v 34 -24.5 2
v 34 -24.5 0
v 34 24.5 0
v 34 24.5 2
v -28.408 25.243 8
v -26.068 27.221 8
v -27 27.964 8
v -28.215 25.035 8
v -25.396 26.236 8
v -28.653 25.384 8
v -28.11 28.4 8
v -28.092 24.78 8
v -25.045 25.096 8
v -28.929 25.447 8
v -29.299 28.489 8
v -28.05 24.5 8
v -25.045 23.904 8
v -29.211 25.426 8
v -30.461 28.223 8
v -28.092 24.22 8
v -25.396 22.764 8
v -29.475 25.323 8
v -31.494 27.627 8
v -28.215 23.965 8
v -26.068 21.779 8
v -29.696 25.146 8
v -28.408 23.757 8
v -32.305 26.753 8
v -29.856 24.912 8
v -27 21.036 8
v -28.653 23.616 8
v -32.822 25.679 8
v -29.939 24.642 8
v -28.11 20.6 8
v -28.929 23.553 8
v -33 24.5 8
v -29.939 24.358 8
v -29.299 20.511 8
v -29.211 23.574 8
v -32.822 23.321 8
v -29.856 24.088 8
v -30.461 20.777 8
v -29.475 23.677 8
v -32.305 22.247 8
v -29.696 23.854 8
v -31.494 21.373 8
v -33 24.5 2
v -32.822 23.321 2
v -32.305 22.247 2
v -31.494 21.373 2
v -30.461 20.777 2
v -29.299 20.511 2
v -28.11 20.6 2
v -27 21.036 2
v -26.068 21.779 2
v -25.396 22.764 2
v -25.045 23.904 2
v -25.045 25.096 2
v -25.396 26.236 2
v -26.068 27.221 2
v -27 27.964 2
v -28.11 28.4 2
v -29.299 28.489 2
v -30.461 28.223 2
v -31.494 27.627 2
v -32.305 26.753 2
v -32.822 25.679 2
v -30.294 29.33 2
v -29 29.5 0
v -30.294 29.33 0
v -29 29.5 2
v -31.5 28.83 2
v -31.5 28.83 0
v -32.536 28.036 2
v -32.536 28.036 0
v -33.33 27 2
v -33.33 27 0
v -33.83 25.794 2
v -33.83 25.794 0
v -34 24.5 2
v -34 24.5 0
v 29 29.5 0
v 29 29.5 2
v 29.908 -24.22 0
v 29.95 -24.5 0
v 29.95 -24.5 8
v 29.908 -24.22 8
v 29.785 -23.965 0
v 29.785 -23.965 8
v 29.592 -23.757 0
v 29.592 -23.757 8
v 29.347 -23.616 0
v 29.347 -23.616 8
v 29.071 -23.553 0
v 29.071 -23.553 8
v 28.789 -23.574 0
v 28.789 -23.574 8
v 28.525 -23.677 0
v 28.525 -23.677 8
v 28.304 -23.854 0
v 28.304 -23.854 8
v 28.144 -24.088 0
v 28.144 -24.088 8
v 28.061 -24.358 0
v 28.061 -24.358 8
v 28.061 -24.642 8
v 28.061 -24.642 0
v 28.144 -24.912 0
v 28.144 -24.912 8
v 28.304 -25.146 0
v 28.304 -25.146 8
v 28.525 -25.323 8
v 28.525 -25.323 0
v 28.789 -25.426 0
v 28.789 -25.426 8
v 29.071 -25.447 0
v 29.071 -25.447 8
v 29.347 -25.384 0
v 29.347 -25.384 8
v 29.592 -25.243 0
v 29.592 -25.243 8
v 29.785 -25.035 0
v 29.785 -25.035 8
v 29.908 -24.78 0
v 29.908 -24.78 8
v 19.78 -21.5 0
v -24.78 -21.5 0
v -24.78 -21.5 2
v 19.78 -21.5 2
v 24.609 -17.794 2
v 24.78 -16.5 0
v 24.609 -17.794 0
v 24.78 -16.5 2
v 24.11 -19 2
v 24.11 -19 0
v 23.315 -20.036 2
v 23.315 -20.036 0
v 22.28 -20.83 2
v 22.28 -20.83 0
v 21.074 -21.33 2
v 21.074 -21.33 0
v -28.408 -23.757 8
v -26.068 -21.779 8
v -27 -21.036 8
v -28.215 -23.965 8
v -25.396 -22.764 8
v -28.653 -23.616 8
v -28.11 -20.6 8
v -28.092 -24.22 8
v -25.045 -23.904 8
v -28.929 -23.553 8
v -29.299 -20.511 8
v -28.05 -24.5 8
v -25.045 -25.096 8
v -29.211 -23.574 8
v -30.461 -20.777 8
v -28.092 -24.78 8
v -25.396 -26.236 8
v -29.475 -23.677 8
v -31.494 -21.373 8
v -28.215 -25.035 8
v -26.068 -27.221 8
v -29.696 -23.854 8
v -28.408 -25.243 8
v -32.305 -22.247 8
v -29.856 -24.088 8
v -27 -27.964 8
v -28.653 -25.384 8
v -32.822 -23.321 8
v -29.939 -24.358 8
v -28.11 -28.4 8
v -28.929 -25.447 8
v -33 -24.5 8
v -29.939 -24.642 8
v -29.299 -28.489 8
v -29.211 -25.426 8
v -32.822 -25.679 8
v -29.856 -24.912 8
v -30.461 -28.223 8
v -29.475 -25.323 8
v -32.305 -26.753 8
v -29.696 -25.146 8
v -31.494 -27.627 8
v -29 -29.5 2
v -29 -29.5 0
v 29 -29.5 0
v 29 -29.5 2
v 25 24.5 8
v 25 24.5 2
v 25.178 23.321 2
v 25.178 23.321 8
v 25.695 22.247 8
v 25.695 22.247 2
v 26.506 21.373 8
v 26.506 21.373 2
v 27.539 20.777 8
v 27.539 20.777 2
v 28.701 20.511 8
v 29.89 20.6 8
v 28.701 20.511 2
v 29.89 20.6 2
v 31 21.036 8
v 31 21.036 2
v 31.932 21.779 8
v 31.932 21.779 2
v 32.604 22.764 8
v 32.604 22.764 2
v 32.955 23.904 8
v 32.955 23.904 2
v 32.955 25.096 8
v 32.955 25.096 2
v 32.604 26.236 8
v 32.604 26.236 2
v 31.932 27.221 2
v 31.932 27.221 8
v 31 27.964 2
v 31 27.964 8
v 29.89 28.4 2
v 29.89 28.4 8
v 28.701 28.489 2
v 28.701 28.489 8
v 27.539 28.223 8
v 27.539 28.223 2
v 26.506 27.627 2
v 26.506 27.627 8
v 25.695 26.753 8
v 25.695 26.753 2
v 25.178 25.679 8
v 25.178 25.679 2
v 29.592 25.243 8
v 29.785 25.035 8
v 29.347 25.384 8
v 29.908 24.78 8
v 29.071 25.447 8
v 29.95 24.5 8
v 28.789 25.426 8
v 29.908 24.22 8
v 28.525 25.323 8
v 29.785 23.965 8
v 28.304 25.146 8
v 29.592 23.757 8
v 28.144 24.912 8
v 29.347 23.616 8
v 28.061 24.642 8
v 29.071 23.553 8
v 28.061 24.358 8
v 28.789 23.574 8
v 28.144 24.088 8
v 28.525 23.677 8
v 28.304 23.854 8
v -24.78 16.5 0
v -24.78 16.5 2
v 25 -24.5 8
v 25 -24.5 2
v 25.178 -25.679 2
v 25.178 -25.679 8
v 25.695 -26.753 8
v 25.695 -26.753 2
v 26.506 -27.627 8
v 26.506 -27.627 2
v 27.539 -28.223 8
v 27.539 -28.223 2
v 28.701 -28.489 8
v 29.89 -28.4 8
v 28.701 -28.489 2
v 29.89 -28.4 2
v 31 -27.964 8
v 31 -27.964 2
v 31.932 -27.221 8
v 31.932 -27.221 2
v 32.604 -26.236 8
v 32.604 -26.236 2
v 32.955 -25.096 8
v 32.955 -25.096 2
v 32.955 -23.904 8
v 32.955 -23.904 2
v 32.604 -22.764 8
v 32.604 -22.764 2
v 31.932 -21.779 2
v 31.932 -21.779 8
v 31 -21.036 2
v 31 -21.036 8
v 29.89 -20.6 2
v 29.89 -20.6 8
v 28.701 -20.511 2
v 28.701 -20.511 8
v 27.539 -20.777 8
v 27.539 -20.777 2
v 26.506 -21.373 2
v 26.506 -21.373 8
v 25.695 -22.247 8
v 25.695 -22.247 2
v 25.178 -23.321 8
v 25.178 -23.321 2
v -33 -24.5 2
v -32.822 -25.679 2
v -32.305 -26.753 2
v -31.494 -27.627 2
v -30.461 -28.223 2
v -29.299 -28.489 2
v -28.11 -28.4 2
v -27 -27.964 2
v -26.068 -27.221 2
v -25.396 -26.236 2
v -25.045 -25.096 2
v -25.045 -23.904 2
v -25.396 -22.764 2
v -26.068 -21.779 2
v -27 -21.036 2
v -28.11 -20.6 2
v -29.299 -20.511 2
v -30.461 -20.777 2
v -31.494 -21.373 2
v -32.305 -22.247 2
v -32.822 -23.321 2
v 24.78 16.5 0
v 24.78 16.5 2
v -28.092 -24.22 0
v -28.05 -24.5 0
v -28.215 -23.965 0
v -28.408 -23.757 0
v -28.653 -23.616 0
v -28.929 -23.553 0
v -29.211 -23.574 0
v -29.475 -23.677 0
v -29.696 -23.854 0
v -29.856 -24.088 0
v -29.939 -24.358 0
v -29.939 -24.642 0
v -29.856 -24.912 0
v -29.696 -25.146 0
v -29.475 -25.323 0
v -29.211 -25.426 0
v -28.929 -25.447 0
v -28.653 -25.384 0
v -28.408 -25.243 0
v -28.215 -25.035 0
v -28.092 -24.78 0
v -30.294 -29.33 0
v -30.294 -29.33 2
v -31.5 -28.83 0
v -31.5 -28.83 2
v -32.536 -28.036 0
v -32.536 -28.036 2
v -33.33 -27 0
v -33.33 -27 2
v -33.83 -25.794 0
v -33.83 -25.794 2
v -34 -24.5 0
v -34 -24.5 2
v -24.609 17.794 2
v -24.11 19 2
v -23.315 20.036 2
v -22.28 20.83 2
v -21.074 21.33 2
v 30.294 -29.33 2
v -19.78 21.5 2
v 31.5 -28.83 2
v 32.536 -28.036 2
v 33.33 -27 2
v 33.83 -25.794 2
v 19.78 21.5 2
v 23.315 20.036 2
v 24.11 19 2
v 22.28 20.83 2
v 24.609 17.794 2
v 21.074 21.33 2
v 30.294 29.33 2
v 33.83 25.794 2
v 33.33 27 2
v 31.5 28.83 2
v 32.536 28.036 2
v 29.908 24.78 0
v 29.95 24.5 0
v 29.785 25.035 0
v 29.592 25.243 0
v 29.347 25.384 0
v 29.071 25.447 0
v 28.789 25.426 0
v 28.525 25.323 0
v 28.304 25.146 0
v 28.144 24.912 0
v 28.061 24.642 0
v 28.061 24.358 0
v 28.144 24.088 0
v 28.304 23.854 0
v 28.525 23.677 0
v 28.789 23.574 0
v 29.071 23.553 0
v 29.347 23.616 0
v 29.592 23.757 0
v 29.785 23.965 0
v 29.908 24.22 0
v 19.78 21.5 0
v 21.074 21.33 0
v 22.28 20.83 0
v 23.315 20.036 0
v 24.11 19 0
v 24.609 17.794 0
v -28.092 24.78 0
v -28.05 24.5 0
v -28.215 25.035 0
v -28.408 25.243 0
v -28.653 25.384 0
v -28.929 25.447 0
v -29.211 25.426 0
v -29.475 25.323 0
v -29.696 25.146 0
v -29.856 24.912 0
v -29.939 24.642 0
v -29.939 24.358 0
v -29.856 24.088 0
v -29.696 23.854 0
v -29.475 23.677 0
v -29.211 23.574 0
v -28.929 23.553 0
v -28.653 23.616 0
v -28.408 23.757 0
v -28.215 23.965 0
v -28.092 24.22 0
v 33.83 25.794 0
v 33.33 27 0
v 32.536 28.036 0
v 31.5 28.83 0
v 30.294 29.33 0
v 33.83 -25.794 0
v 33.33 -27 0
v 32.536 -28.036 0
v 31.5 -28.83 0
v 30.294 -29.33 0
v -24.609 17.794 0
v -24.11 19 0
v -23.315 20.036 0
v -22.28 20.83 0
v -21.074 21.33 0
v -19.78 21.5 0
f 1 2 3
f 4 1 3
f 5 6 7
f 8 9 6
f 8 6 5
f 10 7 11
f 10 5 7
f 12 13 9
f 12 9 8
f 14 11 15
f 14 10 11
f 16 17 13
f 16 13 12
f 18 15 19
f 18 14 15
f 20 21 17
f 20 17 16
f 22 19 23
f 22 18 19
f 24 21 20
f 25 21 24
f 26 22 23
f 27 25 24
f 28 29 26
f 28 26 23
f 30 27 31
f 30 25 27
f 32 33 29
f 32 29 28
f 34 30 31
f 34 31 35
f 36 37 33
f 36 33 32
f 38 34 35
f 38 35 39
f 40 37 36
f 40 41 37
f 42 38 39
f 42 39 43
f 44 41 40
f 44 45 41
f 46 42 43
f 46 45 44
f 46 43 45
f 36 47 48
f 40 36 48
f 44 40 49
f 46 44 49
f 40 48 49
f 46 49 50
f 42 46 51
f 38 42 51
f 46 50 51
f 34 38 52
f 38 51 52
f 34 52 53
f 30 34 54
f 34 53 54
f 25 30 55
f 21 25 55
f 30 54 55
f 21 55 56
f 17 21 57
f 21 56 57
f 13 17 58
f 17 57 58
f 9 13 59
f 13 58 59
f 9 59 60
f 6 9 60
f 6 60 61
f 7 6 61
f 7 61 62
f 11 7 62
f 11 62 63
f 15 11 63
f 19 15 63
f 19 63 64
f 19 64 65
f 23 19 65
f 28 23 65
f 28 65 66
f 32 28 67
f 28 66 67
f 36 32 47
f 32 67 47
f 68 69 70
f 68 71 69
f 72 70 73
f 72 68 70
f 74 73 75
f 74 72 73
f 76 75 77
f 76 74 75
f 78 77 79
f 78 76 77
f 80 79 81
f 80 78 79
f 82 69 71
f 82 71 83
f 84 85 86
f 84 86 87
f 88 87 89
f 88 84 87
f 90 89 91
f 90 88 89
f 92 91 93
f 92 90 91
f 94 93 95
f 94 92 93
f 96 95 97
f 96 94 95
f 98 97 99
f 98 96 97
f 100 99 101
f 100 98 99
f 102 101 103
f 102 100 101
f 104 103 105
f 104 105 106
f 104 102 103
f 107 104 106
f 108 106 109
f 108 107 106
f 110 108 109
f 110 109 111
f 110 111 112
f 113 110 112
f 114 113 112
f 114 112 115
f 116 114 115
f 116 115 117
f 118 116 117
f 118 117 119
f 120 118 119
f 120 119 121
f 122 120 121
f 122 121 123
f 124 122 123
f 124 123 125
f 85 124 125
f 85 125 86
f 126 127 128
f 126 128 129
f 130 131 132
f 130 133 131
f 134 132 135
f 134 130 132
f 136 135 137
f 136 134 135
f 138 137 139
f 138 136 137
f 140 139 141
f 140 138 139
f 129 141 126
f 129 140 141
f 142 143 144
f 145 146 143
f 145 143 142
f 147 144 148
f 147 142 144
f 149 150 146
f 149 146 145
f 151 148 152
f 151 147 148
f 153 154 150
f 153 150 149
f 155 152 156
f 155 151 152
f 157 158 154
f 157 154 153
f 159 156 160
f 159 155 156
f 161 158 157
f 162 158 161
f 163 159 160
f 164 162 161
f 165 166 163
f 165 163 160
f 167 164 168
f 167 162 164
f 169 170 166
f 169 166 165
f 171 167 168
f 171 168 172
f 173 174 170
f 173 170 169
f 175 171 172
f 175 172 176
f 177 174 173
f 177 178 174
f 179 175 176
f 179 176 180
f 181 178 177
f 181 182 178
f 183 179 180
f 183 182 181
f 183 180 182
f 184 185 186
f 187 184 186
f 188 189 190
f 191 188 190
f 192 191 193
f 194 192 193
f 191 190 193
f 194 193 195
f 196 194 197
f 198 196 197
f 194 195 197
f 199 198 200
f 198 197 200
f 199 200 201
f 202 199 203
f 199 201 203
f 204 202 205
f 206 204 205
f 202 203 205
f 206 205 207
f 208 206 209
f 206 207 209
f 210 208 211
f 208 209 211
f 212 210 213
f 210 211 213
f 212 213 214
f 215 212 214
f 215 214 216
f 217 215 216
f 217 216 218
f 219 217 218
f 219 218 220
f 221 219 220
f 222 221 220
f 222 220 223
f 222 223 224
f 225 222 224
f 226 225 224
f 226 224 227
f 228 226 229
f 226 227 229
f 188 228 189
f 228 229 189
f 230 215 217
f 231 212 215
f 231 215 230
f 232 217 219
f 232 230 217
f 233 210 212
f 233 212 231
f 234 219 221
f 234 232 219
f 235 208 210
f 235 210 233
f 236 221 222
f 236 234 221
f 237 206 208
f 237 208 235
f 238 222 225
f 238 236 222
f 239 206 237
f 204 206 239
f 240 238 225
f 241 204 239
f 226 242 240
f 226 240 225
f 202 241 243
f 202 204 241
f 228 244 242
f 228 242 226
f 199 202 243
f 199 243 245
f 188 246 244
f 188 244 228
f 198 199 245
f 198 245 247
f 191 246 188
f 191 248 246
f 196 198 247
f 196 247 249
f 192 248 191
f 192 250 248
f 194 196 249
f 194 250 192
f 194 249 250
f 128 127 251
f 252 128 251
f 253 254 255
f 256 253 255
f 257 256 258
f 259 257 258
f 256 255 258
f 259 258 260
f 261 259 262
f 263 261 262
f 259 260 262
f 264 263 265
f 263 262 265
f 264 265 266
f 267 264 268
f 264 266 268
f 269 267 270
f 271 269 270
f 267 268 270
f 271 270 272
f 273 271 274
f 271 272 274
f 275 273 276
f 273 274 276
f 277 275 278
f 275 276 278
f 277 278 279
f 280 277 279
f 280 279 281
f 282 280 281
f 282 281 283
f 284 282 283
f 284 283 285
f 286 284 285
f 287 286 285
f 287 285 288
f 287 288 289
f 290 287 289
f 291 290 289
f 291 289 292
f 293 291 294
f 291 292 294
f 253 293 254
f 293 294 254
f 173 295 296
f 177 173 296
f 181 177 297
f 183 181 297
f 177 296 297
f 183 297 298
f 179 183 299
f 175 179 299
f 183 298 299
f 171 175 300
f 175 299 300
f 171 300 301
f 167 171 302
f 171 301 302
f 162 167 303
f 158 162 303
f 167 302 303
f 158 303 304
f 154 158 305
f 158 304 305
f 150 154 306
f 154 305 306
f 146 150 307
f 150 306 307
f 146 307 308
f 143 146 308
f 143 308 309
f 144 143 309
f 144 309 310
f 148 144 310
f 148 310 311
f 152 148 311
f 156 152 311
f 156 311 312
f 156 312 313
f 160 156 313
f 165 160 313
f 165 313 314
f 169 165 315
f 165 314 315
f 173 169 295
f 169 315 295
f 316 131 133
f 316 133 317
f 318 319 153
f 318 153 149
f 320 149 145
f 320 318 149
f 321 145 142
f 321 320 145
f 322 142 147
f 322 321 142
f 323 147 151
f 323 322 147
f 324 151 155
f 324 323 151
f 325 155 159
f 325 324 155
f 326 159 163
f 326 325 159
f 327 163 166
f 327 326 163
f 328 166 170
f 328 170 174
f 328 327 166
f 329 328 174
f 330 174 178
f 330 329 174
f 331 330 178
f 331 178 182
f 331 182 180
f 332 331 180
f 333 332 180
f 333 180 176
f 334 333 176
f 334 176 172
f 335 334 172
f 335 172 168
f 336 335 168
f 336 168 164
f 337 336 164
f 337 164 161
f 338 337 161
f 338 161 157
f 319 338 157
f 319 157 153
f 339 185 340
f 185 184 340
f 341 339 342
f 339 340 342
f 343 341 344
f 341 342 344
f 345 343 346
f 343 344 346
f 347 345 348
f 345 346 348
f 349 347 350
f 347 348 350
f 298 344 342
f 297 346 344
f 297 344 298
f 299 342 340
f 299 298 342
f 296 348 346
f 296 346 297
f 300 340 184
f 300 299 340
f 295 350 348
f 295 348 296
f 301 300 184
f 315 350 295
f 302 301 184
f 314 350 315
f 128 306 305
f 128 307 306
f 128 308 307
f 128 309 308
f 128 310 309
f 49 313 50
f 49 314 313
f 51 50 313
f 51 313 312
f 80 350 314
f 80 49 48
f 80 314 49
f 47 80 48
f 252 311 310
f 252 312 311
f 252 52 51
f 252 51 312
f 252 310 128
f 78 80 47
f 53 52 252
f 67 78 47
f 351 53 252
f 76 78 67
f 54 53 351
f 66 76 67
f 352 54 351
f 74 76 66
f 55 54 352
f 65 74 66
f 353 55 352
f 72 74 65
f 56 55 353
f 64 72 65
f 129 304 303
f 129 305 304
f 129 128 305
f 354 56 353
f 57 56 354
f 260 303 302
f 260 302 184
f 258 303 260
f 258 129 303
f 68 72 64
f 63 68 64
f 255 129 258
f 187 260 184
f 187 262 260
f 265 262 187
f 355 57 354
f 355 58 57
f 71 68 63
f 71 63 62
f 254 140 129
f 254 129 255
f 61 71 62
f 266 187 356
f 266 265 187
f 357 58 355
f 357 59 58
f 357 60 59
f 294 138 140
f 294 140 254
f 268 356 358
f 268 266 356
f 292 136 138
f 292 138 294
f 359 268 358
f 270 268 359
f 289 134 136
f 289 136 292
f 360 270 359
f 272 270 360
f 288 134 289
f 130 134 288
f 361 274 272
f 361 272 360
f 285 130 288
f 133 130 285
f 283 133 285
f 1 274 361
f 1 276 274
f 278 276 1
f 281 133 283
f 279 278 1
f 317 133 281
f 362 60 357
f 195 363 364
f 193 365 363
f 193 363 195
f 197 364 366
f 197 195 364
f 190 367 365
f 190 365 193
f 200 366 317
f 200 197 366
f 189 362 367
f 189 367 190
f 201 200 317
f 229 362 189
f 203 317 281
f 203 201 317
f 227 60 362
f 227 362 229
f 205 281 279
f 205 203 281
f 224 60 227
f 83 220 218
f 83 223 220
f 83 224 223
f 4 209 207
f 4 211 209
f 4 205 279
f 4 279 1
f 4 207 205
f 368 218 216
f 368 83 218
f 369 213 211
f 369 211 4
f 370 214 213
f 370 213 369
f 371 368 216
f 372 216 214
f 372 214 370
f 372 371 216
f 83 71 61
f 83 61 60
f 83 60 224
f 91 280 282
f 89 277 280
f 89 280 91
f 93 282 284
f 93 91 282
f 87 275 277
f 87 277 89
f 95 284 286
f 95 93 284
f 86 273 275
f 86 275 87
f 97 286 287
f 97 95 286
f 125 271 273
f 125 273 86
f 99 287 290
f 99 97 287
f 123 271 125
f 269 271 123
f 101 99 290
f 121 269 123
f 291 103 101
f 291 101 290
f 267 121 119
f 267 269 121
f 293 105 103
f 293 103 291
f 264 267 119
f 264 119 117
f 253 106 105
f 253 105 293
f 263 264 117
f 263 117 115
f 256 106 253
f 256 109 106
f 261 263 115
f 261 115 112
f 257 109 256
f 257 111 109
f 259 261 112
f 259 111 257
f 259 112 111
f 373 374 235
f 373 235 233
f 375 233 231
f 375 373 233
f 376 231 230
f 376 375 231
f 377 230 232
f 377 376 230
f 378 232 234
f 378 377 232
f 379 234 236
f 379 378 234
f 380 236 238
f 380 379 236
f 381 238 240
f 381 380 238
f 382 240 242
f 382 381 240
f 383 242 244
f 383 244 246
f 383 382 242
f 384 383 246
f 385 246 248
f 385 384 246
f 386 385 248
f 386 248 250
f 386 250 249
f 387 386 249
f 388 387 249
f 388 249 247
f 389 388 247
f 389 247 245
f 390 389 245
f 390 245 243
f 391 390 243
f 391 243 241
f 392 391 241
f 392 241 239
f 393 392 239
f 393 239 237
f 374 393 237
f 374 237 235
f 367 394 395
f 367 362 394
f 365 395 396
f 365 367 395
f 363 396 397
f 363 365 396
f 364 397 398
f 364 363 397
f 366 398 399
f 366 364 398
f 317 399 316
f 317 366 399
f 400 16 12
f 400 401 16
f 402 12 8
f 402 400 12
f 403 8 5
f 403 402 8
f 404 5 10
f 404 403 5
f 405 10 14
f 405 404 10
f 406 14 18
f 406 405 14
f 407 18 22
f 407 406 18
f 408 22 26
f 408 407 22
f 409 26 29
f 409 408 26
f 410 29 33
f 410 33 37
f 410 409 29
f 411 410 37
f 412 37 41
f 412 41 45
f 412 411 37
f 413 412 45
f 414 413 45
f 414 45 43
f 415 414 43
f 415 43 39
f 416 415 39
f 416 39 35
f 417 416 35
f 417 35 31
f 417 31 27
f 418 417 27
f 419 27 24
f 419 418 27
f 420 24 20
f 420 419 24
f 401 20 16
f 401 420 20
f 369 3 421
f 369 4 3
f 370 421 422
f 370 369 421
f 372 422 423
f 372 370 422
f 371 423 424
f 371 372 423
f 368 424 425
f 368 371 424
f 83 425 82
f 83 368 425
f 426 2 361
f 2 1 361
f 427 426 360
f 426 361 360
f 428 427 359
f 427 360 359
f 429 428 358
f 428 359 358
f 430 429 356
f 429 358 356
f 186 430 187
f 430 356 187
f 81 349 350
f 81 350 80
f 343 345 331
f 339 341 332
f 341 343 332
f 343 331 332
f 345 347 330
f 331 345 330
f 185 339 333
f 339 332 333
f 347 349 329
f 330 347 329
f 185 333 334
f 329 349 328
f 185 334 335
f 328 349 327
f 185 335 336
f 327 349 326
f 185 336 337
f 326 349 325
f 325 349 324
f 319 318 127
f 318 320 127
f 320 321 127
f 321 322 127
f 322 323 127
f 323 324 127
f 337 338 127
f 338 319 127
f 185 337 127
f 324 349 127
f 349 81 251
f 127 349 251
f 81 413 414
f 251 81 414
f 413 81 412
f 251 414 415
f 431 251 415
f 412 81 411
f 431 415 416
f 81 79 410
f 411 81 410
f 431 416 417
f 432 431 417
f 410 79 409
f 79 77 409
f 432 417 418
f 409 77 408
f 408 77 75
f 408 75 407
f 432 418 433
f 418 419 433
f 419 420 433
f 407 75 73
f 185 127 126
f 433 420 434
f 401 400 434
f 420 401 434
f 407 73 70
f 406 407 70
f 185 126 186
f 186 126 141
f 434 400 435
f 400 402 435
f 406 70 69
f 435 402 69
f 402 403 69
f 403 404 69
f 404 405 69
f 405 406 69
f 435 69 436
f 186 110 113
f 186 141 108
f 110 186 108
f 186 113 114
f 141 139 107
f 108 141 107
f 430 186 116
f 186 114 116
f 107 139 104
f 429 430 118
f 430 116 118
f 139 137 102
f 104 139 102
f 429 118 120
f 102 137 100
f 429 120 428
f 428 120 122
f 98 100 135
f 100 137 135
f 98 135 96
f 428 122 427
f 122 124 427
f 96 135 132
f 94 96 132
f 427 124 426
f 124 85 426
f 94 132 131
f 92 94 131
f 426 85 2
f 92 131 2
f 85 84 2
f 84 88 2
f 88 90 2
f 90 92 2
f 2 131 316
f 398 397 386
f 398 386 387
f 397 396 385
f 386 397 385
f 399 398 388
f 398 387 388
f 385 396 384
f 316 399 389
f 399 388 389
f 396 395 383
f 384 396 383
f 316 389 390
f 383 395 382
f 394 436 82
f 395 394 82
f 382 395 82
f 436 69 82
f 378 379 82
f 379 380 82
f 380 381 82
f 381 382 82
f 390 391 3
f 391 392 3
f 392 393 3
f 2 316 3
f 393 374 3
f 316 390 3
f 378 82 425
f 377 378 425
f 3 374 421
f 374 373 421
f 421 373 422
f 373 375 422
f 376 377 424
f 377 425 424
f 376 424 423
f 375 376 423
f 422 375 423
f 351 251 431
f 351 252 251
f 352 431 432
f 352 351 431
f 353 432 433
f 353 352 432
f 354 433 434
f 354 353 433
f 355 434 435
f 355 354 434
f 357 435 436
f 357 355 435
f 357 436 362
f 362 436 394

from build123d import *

# Parameters (mm, degrees)
SKETCH1_W           = 68
SKETCH1_H           = 59
SKETCH1_R           = 0.95
SKETCH1_W_2         = 49.559322034
SKETCH1_H_2         = 43
BOSS_EXTRUDE1_DEPTH = 2
SKETCH2_R           = 4
SKETCH2_R_2         = 0.95
BOSS_EXTRUDE2_DEPTH = 6
FILLET1_R           = 5


with BuildPart() as part:
    # Sketch1 → Boss-Extrude1 (new body)
    with BuildSketch(Plane.XY):
        Rectangle(SKETCH1_W, SKETCH1_H)
        with Locations((-29, 24.5)):
            Circle(SKETCH1_R, mode=Mode.SUBTRACT)
        with Locations((29, 24.5)):
            Circle(SKETCH1_R, mode=Mode.SUBTRACT)
        with Locations((29, -24.5)):
            Circle(SKETCH1_R, mode=Mode.SUBTRACT)
        with Locations((-29, -24.5)):
            Circle(SKETCH1_R, mode=Mode.SUBTRACT)
        Rectangle(SKETCH1_W_2, SKETCH1_H_2, mode=Mode.SUBTRACT)
    extrude(amount=BOSS_EXTRUDE1_DEPTH)

    # Sketch2 → Boss-Extrude2 (add)
    # profile 1 of 4: a face of its own
    with BuildSketch(Plane.XY.offset(2)):
        with Locations(Location((-29, 24.5, 0), (0, 0, 180))):
            Circle(SKETCH2_R)
        with Locations((-29, 24.5)):
            Circle(SKETCH2_R_2, mode=Mode.SUBTRACT)
    # profile 2 of 4: a face of its own
    with BuildSketch(Plane.XY.offset(2)):
        with Locations(Location((29, 24.5, 0), (0, 0, 180))):
            Circle(SKETCH2_R)
        with Locations((29, 24.5)):
            Circle(SKETCH2_R_2, mode=Mode.SUBTRACT)
    # profile 3 of 4: a face of its own
    with BuildSketch(Plane.XY.offset(2)):
        with Locations(Location((29, -24.5, 0), (0, 0, 180))):
            Circle(SKETCH2_R)
        with Locations((29, -24.5)):
            Circle(SKETCH2_R_2, mode=Mode.SUBTRACT)
    # profile 4 of 4: a face of its own
    with BuildSketch(Plane.XY.offset(2)):
        with Locations(Location((-29, -24.5, 0), (0, 0, 180))):
            Circle(SKETCH2_R)
        with Locations((-29, -24.5)):
            Circle(SKETCH2_R_2, mode=Mode.SUBTRACT)
    extrude(amount=BOSS_EXTRUDE2_DEPTH)

    # Fillet1
    fillet1_edges = [part.edges().sort_by_distance(p)[0] for p in [
        (24.779661017, -21.5, 1),
        (24.779661017, 21.5, 1),
        (-24.779661017, 21.5, 1),
        (34, -29.5, 1),
        (-34, -29.5, 1),
        (-34, 29.5, 1),
        (34, 29.5, 1),
    ]]
    fillet(fillet1_edges, radius=FILLET1_R)


solid = part.part
